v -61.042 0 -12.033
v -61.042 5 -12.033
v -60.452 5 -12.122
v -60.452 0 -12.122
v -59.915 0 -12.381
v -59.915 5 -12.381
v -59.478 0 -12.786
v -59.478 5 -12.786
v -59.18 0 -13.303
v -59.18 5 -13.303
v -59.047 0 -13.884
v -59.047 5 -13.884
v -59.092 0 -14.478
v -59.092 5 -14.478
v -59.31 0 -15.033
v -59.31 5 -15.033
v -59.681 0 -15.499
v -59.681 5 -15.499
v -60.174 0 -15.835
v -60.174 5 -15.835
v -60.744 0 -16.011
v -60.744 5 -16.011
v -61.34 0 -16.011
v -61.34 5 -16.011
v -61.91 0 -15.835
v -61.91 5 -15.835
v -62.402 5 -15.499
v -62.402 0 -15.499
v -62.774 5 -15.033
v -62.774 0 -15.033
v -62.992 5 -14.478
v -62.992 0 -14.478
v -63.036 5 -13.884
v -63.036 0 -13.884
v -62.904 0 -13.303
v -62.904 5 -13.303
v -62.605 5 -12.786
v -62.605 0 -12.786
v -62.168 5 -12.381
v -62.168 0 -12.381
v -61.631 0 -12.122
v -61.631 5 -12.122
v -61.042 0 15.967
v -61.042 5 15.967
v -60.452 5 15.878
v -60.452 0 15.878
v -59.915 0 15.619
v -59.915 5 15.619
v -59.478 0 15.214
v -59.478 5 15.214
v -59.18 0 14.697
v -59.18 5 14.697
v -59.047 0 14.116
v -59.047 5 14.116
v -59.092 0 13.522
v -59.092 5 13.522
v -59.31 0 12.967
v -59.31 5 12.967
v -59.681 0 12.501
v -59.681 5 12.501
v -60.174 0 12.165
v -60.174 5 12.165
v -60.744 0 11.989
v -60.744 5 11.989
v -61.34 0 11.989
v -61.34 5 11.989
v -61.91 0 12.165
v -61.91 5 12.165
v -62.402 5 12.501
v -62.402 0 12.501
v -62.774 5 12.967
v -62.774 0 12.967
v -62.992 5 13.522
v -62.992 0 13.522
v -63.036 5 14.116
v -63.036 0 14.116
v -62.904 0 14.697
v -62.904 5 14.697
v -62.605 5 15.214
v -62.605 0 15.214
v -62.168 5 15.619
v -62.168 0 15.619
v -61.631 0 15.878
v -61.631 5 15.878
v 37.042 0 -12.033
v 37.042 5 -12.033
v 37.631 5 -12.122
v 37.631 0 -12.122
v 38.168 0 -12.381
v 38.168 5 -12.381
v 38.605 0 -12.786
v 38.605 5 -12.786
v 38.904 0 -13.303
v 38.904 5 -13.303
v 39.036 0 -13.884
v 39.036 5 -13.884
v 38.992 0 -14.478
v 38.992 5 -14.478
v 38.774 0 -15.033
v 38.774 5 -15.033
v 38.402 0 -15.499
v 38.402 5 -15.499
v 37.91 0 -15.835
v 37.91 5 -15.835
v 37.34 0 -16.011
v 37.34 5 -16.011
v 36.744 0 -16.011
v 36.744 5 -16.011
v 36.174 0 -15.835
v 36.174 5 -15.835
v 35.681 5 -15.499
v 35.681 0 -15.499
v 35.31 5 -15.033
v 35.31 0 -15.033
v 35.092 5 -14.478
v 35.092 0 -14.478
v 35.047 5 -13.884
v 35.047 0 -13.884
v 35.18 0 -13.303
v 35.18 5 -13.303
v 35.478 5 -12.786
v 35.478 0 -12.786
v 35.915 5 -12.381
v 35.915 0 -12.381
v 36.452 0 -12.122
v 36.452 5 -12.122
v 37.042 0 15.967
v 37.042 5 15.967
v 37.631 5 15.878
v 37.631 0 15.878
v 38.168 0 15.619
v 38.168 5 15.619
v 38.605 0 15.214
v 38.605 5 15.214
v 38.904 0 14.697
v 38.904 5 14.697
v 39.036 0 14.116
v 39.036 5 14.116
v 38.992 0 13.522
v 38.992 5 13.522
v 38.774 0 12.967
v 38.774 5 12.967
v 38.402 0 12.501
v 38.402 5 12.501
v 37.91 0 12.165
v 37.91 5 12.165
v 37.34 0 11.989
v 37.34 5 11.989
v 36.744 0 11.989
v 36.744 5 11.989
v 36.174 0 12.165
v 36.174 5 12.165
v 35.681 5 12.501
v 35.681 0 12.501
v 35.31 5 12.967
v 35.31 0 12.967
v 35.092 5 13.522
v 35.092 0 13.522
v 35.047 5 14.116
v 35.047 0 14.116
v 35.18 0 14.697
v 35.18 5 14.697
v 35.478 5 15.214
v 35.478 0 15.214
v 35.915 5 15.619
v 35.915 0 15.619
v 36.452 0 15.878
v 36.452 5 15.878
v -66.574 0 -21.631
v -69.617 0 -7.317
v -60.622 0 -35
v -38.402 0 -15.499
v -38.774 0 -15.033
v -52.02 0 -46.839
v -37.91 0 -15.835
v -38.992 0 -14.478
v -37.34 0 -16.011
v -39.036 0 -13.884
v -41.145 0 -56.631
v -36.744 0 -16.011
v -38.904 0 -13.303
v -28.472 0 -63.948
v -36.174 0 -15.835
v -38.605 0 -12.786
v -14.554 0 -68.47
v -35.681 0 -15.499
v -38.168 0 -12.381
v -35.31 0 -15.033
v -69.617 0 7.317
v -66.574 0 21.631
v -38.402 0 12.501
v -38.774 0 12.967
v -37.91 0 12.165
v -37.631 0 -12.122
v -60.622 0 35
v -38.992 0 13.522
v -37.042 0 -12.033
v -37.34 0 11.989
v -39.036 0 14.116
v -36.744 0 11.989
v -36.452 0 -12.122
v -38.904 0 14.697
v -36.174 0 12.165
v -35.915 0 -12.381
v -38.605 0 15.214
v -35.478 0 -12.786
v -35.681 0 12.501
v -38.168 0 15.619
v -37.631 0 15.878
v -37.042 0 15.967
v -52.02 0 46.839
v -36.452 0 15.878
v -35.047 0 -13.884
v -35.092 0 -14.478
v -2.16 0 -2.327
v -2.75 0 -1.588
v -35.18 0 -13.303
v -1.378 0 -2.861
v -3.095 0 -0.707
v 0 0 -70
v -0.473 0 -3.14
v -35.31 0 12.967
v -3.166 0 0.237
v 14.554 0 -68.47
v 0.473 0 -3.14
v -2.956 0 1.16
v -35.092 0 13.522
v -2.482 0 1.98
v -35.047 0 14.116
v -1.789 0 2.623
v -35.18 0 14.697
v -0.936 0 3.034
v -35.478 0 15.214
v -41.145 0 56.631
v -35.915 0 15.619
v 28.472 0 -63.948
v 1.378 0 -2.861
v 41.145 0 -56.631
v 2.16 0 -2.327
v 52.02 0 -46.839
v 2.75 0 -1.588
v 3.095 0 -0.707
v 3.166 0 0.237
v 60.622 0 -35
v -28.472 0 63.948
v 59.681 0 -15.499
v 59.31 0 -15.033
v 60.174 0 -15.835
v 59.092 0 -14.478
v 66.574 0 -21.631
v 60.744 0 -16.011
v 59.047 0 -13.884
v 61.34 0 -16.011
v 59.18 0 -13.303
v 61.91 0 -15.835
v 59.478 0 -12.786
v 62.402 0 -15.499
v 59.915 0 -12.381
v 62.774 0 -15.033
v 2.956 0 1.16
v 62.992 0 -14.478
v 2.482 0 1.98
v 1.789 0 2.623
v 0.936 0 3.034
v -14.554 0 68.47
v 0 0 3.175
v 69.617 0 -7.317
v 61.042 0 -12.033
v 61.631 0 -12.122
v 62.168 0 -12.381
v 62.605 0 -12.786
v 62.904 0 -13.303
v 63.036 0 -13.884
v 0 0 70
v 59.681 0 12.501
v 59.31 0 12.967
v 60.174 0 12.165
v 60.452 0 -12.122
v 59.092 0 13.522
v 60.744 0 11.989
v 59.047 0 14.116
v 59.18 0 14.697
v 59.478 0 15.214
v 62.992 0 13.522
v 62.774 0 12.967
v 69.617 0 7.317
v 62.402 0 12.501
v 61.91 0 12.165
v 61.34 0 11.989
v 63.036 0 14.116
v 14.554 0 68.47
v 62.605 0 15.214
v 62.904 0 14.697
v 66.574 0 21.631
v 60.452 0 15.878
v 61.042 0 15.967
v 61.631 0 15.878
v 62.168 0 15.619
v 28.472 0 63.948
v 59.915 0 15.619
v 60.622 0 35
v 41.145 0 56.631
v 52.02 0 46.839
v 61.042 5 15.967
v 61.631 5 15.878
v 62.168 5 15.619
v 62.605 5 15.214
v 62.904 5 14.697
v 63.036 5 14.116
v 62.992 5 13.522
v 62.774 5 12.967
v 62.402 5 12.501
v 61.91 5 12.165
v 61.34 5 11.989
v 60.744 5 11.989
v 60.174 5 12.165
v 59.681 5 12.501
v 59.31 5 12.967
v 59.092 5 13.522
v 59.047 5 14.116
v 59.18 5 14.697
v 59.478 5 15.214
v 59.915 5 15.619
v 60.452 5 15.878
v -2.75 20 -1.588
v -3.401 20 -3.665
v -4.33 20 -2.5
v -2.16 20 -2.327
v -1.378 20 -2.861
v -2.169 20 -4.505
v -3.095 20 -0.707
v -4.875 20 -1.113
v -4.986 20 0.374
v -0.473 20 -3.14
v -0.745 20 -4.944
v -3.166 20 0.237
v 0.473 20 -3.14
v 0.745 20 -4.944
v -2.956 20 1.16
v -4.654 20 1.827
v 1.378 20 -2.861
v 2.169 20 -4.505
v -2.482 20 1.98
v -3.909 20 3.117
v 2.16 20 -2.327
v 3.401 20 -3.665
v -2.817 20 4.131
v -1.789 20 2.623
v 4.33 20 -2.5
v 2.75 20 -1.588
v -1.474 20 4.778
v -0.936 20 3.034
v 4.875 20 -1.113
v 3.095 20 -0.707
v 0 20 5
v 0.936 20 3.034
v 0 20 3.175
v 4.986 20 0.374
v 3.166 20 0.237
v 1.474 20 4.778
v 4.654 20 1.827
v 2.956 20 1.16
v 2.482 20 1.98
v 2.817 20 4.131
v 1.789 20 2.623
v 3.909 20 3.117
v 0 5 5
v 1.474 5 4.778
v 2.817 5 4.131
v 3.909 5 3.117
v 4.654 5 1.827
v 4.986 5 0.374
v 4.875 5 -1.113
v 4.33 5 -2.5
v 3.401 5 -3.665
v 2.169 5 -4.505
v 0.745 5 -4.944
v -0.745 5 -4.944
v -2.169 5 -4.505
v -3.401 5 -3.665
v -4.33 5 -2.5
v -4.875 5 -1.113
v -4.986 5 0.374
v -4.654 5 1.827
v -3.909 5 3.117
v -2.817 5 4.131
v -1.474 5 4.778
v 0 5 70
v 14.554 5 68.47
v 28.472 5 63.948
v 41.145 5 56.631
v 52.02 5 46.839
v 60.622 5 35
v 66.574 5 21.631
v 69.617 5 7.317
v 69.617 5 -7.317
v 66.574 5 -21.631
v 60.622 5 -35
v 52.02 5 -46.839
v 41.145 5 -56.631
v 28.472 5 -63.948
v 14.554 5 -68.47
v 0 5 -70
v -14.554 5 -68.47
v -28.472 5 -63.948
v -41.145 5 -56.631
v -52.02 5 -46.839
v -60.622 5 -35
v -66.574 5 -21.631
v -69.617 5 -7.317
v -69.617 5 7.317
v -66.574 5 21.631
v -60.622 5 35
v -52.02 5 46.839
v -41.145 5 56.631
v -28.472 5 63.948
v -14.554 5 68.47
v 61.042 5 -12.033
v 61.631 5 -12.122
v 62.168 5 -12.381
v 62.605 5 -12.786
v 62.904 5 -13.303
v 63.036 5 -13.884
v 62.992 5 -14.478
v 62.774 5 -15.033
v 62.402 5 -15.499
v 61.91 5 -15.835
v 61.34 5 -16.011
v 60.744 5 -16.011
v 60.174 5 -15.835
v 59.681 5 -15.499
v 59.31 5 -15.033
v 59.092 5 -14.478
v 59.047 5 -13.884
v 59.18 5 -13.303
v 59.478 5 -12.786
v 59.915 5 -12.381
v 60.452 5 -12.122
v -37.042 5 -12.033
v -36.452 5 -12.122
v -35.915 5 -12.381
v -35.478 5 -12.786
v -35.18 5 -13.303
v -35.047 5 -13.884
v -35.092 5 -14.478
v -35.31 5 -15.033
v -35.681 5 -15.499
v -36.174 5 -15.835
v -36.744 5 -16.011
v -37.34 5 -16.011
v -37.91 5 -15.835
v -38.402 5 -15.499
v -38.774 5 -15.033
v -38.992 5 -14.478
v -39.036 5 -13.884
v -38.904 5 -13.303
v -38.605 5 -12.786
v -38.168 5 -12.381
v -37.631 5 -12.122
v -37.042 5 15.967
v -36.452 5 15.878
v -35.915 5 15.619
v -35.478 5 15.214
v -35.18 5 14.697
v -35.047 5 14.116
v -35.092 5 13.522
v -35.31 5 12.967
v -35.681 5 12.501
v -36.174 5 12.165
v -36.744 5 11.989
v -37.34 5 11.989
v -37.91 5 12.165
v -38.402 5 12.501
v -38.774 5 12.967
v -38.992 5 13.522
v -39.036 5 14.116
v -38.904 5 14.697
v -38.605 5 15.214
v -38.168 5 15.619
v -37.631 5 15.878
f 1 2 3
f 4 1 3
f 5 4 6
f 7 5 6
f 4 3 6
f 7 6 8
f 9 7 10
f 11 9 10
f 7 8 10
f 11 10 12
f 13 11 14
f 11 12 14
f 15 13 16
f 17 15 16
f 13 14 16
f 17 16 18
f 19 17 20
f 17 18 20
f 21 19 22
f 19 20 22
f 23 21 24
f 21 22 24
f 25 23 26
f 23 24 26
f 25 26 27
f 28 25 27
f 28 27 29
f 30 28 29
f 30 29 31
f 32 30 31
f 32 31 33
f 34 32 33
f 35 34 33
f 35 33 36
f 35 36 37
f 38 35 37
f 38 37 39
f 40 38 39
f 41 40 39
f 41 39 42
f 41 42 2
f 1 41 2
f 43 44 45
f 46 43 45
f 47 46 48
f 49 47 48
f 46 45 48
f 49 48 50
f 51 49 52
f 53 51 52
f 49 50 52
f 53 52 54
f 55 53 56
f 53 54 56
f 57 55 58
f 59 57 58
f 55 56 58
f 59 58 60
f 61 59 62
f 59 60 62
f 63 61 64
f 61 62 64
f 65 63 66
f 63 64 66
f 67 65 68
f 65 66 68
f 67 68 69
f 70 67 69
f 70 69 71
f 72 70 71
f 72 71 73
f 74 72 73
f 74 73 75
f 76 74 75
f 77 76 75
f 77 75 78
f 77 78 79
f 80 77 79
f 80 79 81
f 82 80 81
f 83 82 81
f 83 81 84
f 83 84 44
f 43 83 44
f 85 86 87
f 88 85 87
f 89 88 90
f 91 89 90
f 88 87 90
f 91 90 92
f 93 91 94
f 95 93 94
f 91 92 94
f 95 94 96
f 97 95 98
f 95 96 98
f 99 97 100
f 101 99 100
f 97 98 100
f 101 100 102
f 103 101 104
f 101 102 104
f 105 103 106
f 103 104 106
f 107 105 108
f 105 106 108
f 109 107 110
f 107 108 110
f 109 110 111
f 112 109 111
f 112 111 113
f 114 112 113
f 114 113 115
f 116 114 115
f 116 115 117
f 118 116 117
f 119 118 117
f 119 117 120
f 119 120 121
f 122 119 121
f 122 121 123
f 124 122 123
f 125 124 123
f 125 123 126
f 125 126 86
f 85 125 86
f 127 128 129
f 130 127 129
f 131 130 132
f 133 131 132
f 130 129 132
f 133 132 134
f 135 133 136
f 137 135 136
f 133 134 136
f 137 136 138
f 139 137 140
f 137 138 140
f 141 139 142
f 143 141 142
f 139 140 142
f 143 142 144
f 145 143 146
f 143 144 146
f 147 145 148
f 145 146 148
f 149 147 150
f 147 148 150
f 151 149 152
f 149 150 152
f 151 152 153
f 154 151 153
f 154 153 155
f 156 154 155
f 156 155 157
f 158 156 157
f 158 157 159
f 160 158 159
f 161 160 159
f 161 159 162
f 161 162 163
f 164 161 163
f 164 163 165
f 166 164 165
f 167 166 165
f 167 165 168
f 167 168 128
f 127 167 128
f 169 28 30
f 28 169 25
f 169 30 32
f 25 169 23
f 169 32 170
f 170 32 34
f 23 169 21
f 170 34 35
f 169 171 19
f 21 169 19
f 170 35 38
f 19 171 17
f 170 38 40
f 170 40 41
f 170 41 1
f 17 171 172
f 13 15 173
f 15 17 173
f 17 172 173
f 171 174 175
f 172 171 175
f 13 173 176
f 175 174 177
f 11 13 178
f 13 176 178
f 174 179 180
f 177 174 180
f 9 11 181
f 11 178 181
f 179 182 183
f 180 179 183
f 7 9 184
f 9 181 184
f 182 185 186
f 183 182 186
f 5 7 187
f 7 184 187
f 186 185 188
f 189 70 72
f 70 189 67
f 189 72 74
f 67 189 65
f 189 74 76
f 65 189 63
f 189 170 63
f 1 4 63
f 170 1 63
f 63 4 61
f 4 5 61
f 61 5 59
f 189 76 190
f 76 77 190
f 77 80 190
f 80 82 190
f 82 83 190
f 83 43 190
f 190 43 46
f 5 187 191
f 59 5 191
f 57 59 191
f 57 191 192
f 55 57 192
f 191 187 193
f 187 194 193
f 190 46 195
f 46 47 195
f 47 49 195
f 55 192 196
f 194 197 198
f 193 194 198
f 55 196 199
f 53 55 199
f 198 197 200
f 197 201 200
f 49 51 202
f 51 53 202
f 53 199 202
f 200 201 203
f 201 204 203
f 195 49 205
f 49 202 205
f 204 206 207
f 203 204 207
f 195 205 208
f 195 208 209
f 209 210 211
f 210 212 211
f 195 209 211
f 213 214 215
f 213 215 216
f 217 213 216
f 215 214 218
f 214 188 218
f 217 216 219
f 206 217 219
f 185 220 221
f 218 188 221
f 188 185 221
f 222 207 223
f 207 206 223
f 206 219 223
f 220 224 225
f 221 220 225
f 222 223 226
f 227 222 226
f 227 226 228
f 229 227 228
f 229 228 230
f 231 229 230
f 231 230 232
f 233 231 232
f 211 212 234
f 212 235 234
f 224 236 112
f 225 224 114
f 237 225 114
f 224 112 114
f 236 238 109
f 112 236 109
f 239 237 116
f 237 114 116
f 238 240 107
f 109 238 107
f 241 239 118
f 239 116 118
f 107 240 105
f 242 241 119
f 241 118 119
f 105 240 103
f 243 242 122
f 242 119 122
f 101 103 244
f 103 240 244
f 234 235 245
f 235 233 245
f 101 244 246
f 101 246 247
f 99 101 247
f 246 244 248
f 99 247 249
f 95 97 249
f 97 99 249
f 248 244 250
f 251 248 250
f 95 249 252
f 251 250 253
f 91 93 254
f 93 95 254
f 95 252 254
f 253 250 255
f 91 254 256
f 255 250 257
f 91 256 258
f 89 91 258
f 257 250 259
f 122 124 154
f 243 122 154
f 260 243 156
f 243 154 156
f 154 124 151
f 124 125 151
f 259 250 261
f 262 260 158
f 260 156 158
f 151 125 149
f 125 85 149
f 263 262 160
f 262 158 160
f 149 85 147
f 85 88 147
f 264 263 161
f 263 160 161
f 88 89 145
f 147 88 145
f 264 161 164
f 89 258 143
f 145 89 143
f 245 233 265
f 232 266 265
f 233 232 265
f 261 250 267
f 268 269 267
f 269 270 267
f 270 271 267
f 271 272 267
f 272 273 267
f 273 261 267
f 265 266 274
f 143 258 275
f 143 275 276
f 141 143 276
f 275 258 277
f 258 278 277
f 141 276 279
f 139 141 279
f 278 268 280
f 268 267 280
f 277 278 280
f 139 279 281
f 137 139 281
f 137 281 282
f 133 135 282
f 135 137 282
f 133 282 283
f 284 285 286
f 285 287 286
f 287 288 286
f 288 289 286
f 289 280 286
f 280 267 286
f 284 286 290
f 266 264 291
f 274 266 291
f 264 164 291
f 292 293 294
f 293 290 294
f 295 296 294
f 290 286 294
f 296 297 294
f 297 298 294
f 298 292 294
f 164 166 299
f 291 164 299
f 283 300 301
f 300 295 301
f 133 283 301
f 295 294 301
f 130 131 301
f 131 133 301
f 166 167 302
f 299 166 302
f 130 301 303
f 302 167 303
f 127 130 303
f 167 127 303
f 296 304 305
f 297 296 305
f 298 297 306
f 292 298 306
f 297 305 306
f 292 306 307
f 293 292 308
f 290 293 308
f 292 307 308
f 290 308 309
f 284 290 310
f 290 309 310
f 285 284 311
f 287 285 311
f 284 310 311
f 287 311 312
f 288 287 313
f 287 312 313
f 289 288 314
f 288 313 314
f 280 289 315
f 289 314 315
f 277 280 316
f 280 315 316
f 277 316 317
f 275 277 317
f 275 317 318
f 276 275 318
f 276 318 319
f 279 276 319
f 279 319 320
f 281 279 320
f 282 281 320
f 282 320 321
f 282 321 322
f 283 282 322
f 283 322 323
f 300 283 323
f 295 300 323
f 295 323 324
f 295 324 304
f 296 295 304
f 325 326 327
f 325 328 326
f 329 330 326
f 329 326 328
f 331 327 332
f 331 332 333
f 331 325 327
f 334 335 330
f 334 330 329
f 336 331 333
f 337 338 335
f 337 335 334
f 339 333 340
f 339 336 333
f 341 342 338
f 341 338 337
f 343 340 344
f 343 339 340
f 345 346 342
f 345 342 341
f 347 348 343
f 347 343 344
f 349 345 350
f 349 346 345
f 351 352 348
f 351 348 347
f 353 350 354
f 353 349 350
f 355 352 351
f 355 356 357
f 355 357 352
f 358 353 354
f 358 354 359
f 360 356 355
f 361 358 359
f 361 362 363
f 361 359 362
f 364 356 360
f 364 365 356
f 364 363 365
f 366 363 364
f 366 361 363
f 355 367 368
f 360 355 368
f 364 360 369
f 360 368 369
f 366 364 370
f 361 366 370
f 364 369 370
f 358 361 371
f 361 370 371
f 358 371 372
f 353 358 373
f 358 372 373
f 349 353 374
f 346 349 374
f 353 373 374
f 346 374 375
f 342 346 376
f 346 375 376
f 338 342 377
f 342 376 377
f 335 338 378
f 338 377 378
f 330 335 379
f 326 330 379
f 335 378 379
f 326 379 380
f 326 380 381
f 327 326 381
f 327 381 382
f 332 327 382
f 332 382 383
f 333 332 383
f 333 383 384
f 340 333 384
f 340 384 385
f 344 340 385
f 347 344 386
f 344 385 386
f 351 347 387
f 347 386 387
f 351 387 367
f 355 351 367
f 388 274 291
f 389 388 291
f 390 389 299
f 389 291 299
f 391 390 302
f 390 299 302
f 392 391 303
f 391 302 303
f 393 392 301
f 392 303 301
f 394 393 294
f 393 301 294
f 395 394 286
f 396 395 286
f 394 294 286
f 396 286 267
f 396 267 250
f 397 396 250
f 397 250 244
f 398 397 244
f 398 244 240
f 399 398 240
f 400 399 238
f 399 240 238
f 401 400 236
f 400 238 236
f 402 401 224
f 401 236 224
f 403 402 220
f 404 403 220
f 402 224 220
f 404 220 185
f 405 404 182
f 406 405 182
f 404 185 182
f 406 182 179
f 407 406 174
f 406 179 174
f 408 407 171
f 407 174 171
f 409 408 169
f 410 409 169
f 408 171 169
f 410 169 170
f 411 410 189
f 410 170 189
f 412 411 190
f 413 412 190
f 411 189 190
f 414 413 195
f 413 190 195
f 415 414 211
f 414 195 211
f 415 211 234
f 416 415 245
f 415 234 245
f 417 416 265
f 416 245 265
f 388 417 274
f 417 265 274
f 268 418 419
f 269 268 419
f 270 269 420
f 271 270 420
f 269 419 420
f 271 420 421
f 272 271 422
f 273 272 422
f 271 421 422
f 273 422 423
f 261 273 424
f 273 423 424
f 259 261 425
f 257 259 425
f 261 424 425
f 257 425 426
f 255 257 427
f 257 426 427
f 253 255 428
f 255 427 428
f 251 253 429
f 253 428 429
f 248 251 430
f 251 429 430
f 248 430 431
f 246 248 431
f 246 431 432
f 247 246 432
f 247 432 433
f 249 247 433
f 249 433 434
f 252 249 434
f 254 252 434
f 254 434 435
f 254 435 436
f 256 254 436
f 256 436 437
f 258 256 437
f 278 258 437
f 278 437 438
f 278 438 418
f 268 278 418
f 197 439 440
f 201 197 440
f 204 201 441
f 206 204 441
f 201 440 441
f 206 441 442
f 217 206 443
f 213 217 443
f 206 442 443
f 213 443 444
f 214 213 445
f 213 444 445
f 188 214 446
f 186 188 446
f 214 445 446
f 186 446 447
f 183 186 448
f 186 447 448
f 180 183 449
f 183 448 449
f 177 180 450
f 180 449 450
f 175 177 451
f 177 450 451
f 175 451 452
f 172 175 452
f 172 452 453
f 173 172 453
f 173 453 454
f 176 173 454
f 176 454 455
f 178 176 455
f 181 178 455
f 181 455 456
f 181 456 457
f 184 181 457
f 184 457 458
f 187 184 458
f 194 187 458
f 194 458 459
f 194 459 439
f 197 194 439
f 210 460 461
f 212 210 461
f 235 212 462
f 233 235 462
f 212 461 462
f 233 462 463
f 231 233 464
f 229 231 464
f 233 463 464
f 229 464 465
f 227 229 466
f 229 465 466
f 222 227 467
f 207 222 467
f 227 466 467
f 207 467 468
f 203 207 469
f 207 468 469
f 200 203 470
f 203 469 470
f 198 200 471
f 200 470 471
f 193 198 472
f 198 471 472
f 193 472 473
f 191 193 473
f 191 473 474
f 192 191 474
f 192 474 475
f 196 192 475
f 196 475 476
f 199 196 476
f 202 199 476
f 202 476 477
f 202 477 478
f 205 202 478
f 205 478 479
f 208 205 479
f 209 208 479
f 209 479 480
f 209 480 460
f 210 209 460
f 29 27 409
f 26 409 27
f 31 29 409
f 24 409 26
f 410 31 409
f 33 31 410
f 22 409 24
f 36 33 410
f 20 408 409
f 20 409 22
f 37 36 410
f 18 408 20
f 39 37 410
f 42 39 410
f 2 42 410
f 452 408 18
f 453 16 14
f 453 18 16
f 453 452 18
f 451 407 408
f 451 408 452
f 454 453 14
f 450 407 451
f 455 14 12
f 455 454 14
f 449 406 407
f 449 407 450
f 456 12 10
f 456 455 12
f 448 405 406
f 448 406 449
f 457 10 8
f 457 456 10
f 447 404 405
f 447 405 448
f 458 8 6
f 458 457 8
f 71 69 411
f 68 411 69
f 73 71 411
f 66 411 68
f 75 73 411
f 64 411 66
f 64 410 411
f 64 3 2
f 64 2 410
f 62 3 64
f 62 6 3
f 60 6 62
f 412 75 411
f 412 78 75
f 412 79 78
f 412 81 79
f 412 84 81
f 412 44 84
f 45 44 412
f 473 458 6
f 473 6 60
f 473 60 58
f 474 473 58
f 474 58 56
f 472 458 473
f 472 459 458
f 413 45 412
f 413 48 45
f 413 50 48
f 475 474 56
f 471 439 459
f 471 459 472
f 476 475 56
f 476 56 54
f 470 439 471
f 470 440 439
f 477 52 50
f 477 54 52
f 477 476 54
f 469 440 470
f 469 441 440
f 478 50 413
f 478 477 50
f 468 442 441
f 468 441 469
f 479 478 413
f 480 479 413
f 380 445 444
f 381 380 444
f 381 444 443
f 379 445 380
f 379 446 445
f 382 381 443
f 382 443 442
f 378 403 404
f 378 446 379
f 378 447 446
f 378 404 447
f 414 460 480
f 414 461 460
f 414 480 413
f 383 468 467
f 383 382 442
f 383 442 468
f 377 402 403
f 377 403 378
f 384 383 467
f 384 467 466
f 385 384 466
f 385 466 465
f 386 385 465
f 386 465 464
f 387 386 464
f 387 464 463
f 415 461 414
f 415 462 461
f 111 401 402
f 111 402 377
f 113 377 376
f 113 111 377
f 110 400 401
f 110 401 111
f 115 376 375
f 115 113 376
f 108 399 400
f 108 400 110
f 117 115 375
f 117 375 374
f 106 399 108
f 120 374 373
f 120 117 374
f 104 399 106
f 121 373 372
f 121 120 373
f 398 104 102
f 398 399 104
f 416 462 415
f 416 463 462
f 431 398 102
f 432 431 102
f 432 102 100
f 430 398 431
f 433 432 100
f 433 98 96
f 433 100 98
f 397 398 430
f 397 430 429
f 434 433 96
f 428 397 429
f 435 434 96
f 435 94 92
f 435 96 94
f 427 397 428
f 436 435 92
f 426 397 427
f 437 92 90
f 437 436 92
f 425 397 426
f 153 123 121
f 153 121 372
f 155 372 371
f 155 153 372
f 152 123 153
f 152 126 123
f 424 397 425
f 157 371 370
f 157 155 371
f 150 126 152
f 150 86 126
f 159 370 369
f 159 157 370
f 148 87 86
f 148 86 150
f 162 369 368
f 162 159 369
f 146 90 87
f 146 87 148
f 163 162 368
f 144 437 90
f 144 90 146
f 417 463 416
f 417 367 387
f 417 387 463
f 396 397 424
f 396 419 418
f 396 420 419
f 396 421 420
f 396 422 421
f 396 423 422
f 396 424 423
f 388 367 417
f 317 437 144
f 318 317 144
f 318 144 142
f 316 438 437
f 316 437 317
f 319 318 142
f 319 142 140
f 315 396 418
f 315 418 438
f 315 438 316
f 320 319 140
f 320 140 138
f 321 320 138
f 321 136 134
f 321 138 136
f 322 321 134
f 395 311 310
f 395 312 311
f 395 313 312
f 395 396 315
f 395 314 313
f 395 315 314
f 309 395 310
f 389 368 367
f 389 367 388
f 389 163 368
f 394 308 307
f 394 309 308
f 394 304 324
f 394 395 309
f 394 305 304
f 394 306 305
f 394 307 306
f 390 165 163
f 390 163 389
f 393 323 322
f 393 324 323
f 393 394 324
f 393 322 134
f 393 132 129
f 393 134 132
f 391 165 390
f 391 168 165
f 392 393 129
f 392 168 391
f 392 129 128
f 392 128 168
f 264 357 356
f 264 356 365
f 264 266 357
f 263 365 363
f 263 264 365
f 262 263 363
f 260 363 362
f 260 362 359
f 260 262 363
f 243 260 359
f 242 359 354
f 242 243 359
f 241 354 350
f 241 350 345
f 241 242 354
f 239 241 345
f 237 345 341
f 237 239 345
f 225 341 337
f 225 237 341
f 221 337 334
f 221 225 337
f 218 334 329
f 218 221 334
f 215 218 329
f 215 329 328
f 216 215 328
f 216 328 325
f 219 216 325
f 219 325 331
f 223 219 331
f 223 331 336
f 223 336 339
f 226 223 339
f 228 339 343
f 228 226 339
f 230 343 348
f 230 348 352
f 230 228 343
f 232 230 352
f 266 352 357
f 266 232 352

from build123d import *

# Parameters (mm, degrees)
SKETCH1_R           = 70
SKETCH1_R_2         = 3.175
BOSS_EXTRUDE2_DEPTH = 5
SKETCH2_R           = 5
SKETCH2_R_2         = 3.175
BOSS_EXTRUDE4_DEPTH = 15
SKETCH5_R           = 2
CUT_EXTRUDE4_DEPTH  = 101.124921973


with BuildPart() as part:
    # Sketch1 → Boss-Extrude2 (new body)
    with BuildSketch(Plane(origin=(0, 0, 0), x_dir=(1, 0, 0), z_dir=(0, 1, 0))):
        with Locations(Location((0, 0, 0), (0, 0, 270))):
            Circle(SKETCH1_R)
        with Locations(Location((0, 0, 0), (0, 0, 270))):
            Circle(SKETCH1_R_2, mode=Mode.SUBTRACT)
    extrude(amount=BOSS_EXTRUDE2_DEPTH)

    # Sketch2 → Boss-Extrude4 (add)
    with BuildSketch(Plane(origin=(0, 5, 0), x_dir=(1, 0, 0), z_dir=(0, 1, 0))):
        with Locations(Location((0, 0, 0), (0, 0, 270))):
            Circle(SKETCH2_R)
        with Locations(Location((0, 0, 0), (0, 0, 270))):
            Circle(SKETCH2_R_2, mode=Mode.SUBTRACT)
    extrude(amount=BOSS_EXTRUDE4_DEPTH)

    # Sketch5 → Cut-Extrude4 (cut, through all)
    with BuildSketch(Plane(origin=(0, 5, 0), x_dir=(1, 0, 0), z_dir=(0, 1, 0))):
        with Locations(Location((-61.041759509, 14.033218695, 0), (0, 0, 270))):
            Circle(SKETCH5_R)
        with Locations(Location((-37.041759509, 14.033218695, 0), (0, 0, 270))):
            Circle(SKETCH5_R)
        with Locations(Location((-61.041759509, -13.966781305, 0), (0, 0, 270))):
            Circle(SKETCH5_R)
        with Locations(Location((-37.041759509, -13.966781305, 0), (0, 0, 270))):
            Circle(SKETCH5_R)
        with Locations(Location((37.041759509, 14.033218695, 0), (0, 0, 270))):
            Circle(SKETCH5_R)
        with Locations(Location((61.041759509, 14.033218695, 0), (0, 0, 270))):
            Circle(SKETCH5_R)
        with Locations(Location((37.041759509, -13.966781305, 0), (0, 0, 270))):
            Circle(SKETCH5_R)
        with Locations(Location((61.041759509, -13.966781305, 0), (0, 0, 270))):
            Circle(SKETCH5_R)
    extrude(amount=-CUT_EXTRUDE4_DEPTH, mode=Mode.SUBTRACT)


solid = part.part
